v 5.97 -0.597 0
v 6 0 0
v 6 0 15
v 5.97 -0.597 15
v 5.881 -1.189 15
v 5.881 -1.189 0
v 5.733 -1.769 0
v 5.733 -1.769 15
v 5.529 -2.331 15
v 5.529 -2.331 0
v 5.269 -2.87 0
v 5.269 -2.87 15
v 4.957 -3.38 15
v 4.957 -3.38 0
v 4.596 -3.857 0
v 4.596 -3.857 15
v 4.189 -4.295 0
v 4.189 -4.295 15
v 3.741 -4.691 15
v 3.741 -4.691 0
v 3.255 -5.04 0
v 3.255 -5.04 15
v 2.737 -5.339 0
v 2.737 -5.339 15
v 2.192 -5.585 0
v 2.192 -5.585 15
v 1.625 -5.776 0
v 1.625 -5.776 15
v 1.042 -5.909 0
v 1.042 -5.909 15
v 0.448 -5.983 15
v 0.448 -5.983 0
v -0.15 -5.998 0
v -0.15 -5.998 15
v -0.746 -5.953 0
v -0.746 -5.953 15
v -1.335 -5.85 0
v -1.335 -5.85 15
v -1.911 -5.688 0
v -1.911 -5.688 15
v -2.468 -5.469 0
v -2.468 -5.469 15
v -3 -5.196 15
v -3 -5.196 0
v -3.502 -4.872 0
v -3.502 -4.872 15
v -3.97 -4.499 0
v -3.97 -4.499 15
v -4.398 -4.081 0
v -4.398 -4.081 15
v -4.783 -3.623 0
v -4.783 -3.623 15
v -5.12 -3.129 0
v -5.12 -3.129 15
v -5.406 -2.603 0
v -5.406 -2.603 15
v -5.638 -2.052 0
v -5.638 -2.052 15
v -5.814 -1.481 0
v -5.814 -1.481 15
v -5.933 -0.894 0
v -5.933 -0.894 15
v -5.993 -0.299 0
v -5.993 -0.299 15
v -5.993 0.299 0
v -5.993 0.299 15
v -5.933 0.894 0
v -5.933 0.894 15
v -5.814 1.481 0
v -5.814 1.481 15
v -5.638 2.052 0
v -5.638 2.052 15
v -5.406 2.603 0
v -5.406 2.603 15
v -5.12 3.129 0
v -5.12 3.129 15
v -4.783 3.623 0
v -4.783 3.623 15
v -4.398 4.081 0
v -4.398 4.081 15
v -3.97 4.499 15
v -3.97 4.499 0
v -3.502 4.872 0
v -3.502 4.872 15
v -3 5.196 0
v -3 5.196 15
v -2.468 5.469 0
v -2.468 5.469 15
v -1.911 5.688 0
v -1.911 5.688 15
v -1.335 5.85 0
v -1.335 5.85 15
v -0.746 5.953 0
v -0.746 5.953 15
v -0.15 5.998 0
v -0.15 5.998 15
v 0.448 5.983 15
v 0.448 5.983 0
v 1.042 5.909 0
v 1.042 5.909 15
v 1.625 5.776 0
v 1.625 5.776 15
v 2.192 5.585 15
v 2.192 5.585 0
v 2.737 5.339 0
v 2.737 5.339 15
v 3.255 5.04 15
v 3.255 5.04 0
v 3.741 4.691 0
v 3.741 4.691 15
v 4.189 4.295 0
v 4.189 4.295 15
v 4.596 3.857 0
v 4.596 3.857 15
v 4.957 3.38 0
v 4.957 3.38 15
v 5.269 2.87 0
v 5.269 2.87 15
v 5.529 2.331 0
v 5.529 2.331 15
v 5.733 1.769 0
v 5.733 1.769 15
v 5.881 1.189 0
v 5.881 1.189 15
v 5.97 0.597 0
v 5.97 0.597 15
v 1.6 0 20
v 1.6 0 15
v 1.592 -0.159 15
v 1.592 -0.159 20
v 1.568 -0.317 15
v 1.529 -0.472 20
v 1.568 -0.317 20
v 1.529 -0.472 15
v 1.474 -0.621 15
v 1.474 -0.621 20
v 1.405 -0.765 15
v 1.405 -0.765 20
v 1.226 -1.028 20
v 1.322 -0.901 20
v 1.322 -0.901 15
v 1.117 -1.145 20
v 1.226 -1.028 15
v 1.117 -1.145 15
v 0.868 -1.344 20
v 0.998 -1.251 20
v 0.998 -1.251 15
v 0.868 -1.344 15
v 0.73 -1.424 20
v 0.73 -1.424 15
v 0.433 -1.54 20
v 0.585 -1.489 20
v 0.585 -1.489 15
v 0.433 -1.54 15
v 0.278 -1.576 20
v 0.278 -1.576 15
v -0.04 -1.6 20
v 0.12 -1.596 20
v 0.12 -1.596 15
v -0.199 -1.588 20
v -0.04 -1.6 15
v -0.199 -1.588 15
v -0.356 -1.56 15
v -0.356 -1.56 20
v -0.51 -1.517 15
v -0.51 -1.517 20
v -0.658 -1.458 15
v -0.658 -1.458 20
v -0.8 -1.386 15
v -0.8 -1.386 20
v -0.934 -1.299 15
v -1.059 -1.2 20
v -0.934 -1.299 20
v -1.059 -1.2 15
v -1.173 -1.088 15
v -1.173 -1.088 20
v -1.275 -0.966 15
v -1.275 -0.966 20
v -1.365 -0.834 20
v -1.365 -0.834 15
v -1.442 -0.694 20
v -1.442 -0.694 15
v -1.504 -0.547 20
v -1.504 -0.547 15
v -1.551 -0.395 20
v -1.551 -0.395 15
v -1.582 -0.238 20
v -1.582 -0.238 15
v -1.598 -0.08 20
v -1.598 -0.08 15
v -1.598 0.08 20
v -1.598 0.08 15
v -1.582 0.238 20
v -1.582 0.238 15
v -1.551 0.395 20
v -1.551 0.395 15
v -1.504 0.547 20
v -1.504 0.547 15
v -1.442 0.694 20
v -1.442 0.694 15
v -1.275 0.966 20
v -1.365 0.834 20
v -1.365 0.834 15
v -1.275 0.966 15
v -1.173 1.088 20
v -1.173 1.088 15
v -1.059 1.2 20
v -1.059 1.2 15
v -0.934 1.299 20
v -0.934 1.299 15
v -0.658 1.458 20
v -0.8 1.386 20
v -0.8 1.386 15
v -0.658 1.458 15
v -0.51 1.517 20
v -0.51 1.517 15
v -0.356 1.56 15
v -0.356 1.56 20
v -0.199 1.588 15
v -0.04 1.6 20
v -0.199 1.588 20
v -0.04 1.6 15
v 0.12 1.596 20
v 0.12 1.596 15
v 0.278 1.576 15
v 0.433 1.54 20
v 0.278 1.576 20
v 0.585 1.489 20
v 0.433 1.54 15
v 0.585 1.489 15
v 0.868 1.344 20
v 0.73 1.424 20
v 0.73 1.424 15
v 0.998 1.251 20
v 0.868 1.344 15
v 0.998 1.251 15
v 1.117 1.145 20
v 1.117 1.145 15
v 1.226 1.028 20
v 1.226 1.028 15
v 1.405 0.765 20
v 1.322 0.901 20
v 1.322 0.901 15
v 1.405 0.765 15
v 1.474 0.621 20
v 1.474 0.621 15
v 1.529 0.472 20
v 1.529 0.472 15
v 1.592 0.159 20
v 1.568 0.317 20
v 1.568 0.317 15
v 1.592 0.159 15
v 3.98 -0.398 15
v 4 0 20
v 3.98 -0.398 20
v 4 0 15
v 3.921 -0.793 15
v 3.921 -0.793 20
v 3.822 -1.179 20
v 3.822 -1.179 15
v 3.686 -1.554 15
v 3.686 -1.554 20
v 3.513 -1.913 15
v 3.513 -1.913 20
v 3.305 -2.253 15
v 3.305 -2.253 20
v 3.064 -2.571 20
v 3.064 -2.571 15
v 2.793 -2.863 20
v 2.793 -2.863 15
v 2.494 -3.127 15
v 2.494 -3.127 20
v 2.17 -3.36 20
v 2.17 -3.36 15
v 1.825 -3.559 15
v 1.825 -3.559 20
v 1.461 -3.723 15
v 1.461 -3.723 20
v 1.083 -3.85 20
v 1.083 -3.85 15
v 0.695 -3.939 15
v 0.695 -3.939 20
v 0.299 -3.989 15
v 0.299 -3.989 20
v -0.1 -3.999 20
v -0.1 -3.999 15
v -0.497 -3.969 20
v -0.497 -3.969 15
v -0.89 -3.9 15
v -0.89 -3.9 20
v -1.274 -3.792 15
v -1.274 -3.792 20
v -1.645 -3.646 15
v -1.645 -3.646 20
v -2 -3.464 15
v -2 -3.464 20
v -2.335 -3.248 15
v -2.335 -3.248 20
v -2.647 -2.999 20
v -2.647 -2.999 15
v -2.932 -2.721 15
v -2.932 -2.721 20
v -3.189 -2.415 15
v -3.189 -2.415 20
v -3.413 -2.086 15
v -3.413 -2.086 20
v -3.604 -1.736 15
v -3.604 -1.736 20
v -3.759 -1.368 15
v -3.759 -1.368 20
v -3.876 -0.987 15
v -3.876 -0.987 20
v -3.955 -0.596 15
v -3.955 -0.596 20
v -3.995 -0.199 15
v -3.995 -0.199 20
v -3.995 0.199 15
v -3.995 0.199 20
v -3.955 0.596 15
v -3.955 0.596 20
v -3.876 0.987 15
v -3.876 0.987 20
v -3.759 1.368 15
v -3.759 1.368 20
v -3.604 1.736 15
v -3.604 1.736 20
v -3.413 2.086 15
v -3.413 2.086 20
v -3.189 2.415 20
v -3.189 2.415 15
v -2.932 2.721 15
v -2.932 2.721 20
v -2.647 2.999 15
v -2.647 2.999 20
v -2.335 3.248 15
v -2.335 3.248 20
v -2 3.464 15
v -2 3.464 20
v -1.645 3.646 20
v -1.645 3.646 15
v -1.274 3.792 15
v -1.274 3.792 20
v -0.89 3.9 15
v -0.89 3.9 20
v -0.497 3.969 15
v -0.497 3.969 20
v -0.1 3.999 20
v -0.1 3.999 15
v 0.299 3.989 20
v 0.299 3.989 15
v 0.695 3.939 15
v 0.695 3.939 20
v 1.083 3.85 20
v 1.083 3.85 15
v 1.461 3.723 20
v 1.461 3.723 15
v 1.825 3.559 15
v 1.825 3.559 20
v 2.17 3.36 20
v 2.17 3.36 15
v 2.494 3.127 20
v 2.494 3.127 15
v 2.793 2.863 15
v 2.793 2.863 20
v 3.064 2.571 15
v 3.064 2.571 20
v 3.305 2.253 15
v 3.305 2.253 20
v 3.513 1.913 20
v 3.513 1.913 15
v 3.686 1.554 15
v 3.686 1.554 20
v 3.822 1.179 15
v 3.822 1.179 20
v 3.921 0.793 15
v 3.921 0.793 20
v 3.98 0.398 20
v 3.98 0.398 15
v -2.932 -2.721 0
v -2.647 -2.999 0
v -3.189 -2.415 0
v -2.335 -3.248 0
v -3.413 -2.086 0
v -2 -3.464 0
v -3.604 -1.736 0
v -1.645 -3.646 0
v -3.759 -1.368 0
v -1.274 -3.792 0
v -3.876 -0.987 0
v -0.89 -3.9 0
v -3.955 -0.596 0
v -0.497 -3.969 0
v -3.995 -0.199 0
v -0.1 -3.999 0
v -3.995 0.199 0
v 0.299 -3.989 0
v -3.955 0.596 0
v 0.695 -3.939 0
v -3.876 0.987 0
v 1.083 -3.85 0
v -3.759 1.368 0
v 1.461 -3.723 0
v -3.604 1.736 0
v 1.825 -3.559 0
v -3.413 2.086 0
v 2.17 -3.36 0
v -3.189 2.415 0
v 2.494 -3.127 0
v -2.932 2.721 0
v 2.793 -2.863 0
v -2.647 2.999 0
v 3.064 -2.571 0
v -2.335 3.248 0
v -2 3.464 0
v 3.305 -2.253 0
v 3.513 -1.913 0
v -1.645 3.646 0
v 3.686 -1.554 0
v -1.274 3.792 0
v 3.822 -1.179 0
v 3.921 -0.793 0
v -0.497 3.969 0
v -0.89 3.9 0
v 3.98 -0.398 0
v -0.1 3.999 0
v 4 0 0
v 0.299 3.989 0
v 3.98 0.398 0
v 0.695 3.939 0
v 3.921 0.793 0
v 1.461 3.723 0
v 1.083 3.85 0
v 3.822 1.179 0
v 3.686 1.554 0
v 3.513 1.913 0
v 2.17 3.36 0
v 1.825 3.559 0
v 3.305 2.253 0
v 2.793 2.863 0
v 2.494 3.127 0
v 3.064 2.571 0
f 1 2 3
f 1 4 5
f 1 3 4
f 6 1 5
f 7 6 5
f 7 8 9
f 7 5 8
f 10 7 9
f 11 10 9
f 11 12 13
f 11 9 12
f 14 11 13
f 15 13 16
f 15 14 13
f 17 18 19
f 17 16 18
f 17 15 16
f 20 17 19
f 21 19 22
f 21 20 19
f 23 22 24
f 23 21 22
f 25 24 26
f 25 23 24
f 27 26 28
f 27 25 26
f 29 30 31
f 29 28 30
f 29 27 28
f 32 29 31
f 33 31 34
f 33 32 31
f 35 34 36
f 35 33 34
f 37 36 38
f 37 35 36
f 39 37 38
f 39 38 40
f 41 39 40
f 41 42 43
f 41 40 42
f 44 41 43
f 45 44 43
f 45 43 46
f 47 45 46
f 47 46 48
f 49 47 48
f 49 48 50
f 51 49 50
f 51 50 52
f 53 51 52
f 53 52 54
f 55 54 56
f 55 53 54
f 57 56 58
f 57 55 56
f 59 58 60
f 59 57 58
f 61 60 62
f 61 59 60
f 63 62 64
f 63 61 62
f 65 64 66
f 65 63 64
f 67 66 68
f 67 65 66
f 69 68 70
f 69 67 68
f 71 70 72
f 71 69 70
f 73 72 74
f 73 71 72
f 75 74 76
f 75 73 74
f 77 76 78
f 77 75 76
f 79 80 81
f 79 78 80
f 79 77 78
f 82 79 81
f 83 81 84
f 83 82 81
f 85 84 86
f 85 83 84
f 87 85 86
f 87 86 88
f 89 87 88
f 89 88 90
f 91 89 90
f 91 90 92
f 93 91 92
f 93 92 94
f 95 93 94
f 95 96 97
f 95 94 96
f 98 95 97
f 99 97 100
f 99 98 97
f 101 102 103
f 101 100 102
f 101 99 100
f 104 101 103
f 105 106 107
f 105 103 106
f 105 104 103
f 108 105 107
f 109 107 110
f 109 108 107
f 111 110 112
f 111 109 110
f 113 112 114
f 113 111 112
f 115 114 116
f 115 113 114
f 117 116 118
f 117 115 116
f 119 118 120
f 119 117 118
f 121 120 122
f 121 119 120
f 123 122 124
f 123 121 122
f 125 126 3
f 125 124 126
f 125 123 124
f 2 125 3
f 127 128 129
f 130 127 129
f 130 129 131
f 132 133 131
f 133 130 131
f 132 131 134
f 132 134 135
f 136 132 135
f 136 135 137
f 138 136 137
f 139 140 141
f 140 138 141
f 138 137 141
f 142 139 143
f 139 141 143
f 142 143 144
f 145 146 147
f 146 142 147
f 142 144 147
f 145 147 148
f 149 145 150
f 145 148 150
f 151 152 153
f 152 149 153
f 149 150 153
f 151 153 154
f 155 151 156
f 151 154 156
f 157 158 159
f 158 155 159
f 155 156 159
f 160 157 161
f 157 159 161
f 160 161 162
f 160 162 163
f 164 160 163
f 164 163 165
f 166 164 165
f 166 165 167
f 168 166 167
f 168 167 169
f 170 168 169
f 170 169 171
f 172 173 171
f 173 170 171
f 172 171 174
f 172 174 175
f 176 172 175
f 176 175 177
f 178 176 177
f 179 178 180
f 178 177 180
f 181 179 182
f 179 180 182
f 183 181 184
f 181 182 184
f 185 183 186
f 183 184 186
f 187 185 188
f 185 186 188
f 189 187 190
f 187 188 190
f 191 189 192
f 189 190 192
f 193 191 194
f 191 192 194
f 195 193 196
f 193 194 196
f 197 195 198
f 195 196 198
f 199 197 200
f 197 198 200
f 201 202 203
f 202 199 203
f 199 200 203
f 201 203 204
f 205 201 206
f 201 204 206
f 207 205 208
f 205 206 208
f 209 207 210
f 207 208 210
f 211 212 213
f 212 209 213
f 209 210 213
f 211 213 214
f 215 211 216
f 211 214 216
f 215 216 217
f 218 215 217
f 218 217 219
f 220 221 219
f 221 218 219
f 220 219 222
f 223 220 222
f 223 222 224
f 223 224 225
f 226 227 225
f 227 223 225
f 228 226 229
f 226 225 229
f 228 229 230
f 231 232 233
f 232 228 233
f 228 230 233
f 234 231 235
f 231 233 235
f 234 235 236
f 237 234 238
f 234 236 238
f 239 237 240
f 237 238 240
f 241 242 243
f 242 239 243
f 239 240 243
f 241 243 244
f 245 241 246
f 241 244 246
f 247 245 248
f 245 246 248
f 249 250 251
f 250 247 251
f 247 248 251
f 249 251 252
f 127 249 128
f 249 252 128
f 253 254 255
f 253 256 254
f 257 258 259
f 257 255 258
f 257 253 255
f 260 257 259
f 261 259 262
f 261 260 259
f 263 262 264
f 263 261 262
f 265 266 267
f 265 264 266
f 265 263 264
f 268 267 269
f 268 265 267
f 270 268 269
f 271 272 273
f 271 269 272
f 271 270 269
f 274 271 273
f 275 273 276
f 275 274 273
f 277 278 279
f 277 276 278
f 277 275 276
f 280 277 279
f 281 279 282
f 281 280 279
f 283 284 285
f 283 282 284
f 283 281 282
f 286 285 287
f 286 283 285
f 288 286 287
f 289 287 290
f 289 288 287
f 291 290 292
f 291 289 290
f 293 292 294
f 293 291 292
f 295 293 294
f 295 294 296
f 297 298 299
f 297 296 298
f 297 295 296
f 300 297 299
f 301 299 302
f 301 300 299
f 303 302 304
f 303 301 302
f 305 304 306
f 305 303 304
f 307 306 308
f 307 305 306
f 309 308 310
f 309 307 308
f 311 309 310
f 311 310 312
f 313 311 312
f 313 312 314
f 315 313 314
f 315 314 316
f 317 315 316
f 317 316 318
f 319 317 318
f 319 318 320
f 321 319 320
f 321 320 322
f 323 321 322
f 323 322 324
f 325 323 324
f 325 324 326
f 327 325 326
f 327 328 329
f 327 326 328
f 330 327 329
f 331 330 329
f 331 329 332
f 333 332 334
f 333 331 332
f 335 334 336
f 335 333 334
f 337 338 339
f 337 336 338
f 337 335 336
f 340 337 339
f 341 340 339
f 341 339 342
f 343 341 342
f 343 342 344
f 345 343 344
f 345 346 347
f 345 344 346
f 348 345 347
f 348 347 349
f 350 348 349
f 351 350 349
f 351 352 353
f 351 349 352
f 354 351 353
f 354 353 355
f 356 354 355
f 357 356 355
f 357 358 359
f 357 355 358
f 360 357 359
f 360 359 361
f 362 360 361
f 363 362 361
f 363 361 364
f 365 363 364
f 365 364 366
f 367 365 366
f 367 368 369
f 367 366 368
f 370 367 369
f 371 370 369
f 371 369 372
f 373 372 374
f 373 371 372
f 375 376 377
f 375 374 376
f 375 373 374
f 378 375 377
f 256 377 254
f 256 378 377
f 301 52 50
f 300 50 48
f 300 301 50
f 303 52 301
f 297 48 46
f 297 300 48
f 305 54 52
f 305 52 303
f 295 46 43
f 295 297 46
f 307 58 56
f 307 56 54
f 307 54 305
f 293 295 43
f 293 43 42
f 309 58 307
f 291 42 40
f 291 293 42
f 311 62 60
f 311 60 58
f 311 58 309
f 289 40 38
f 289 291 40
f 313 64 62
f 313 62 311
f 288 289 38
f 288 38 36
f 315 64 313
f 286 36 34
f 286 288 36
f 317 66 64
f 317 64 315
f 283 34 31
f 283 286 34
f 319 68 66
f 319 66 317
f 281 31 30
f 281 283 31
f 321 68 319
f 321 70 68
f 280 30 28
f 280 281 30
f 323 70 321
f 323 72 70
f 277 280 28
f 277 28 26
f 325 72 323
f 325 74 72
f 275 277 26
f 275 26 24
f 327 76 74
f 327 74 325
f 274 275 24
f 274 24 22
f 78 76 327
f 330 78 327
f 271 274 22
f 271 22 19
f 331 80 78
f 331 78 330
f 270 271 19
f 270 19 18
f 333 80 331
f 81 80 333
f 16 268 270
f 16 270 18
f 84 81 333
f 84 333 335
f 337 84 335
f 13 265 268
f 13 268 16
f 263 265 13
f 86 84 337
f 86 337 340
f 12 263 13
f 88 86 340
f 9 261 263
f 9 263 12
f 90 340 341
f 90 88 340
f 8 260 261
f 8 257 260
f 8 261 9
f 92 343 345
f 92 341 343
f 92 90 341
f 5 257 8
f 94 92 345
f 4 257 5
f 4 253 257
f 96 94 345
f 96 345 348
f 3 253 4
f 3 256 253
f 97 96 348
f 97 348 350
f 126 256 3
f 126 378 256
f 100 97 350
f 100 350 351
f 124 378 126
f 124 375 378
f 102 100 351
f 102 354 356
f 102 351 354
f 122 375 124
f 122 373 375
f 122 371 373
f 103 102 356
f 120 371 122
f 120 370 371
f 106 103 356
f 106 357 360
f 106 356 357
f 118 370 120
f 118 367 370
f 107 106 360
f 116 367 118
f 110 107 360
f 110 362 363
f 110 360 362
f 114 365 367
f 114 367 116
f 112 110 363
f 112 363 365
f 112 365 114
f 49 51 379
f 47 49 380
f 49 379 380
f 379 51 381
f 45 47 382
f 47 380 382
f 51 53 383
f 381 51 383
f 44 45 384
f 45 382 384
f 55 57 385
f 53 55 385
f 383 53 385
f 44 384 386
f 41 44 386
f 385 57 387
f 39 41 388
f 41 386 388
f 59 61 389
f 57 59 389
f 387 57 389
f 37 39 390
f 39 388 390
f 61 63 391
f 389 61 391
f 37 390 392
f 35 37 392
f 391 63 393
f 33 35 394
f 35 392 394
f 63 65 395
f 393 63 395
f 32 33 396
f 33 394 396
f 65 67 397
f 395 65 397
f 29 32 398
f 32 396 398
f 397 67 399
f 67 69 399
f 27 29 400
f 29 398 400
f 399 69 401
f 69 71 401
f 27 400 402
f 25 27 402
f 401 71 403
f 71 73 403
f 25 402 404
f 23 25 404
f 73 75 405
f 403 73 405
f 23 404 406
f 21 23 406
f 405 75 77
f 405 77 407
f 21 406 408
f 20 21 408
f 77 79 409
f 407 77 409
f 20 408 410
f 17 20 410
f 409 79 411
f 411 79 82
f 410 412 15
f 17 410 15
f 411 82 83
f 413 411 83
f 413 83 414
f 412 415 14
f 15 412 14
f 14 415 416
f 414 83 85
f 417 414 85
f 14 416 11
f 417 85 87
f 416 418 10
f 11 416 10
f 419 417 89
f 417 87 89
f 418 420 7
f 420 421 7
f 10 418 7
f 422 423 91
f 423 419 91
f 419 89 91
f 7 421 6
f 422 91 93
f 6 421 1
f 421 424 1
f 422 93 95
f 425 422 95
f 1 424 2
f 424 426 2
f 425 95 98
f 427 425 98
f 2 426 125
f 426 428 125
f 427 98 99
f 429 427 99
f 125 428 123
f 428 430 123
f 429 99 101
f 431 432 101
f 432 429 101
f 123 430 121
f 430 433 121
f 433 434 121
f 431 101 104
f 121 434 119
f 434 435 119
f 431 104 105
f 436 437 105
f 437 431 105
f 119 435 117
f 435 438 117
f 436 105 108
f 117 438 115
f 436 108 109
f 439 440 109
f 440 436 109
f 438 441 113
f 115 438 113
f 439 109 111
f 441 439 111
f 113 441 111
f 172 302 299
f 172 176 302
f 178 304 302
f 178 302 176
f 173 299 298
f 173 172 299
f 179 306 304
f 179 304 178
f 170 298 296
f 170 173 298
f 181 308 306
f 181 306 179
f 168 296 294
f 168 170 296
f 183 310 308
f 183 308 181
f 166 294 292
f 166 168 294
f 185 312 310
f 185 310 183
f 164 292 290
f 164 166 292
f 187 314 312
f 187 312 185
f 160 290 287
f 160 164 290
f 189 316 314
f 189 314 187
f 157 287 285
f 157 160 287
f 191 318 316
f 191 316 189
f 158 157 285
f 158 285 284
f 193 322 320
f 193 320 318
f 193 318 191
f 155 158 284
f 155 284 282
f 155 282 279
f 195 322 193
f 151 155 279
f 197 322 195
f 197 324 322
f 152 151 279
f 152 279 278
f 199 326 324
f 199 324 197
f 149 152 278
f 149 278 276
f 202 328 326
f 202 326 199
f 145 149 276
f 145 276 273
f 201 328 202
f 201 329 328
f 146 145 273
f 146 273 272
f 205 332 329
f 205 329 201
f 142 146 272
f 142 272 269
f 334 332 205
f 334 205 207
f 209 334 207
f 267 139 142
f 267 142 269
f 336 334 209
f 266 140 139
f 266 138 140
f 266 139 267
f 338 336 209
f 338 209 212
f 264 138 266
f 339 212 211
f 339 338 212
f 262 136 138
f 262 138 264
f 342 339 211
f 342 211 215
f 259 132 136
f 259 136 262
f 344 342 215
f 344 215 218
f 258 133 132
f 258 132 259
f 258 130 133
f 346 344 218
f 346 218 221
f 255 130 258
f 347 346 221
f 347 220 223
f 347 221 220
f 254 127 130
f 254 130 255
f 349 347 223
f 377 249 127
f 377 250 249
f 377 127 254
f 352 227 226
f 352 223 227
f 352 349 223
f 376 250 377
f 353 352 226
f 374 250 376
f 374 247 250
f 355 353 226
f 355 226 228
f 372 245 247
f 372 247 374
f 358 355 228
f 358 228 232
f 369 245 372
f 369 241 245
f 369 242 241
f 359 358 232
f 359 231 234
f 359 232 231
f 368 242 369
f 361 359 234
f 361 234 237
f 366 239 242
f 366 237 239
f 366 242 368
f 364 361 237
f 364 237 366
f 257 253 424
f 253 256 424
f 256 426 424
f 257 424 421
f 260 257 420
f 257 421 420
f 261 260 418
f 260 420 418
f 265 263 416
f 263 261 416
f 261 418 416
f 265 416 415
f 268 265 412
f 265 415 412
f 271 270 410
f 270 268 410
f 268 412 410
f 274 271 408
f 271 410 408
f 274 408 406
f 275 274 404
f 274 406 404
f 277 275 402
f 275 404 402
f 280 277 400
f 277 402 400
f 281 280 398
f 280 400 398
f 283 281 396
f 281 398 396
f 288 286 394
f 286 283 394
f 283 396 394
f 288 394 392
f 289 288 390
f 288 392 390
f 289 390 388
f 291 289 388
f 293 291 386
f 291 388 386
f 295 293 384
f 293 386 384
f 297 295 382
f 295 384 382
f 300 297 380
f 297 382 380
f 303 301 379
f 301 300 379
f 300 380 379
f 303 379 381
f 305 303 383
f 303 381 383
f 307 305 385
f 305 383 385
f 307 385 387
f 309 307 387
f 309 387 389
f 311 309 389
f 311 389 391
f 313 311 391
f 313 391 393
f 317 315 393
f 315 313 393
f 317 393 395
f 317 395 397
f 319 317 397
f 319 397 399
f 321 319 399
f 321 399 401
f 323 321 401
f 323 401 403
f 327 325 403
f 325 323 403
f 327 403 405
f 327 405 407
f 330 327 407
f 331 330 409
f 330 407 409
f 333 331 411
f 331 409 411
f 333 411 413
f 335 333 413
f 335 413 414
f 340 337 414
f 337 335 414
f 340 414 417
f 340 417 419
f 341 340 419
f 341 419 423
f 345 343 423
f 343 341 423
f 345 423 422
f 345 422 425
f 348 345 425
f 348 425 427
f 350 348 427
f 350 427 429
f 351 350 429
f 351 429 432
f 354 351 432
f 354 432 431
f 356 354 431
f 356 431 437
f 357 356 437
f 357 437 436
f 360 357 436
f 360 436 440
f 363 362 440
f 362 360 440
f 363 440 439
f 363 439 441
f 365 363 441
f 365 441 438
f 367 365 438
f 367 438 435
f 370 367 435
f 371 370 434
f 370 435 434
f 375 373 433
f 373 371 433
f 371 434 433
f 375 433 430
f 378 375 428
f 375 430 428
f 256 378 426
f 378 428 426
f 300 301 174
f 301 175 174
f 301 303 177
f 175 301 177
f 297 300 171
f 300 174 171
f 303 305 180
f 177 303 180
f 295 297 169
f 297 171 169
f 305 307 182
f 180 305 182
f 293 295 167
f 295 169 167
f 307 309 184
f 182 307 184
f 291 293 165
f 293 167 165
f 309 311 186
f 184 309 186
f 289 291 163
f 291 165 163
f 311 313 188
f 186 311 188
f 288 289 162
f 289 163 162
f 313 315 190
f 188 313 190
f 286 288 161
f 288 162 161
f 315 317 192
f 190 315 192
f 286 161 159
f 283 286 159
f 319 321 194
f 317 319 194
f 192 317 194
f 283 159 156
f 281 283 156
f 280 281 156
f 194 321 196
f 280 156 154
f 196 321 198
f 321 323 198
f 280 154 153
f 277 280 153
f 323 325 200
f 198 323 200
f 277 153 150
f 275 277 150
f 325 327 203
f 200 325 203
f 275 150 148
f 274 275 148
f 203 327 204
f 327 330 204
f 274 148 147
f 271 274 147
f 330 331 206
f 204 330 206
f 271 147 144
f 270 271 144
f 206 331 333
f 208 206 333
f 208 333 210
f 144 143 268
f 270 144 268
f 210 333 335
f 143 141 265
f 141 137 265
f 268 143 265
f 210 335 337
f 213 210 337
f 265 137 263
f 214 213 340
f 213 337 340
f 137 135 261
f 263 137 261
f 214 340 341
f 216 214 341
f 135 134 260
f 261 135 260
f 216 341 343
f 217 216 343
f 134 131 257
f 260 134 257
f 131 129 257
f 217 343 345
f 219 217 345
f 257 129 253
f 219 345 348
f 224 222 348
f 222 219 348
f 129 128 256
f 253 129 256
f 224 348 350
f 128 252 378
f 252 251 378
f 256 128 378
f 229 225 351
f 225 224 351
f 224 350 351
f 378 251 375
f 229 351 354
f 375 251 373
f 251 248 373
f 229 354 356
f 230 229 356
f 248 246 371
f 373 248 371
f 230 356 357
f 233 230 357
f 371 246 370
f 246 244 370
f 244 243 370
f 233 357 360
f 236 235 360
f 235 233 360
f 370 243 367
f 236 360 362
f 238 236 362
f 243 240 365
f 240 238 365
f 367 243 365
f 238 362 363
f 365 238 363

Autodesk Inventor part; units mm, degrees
ref_plane "YZ Plane" through (0, 0, 0) normal (1, 0, 0) x (0, 1, 0)
ref_plane "XZ Plane" through (0, 0, 0) normal (0, 1, 0) x (-1, 0, 0)
ref_plane "XY Plane" through (0, 0, 0) normal (0, 0, 1) x (1, 0, 0)
sketch "スケッチ1" plane through (0, 0, 0) normal (0, 0, 1) x (1, 0, 0)
  circle A0 centre (0, 0) radius 6
  circle A1 centre (0, 0) radius 4
  dimension "d0" = 12
  dimension "d3" = 8
extrude "押し出し1" add sketch "スケッチ1" along normal blind 15
sketch "スケッチ2" plane through (0, 0, 15) normal (0, 0, 1) x (1, 0, 0)
  circle A0 centre (0, 0) radius 6 projected
  circle A1 centre (0, 0) radius 4 projected
  circle A2 centre (0, 0) radius 1.6
  dimension "d6" = 3.2
extrude "押し出し2" add sketch "スケッチ2" along normal blind 5 contours A1
properties part number "ボディ" material "アルミニウム"
